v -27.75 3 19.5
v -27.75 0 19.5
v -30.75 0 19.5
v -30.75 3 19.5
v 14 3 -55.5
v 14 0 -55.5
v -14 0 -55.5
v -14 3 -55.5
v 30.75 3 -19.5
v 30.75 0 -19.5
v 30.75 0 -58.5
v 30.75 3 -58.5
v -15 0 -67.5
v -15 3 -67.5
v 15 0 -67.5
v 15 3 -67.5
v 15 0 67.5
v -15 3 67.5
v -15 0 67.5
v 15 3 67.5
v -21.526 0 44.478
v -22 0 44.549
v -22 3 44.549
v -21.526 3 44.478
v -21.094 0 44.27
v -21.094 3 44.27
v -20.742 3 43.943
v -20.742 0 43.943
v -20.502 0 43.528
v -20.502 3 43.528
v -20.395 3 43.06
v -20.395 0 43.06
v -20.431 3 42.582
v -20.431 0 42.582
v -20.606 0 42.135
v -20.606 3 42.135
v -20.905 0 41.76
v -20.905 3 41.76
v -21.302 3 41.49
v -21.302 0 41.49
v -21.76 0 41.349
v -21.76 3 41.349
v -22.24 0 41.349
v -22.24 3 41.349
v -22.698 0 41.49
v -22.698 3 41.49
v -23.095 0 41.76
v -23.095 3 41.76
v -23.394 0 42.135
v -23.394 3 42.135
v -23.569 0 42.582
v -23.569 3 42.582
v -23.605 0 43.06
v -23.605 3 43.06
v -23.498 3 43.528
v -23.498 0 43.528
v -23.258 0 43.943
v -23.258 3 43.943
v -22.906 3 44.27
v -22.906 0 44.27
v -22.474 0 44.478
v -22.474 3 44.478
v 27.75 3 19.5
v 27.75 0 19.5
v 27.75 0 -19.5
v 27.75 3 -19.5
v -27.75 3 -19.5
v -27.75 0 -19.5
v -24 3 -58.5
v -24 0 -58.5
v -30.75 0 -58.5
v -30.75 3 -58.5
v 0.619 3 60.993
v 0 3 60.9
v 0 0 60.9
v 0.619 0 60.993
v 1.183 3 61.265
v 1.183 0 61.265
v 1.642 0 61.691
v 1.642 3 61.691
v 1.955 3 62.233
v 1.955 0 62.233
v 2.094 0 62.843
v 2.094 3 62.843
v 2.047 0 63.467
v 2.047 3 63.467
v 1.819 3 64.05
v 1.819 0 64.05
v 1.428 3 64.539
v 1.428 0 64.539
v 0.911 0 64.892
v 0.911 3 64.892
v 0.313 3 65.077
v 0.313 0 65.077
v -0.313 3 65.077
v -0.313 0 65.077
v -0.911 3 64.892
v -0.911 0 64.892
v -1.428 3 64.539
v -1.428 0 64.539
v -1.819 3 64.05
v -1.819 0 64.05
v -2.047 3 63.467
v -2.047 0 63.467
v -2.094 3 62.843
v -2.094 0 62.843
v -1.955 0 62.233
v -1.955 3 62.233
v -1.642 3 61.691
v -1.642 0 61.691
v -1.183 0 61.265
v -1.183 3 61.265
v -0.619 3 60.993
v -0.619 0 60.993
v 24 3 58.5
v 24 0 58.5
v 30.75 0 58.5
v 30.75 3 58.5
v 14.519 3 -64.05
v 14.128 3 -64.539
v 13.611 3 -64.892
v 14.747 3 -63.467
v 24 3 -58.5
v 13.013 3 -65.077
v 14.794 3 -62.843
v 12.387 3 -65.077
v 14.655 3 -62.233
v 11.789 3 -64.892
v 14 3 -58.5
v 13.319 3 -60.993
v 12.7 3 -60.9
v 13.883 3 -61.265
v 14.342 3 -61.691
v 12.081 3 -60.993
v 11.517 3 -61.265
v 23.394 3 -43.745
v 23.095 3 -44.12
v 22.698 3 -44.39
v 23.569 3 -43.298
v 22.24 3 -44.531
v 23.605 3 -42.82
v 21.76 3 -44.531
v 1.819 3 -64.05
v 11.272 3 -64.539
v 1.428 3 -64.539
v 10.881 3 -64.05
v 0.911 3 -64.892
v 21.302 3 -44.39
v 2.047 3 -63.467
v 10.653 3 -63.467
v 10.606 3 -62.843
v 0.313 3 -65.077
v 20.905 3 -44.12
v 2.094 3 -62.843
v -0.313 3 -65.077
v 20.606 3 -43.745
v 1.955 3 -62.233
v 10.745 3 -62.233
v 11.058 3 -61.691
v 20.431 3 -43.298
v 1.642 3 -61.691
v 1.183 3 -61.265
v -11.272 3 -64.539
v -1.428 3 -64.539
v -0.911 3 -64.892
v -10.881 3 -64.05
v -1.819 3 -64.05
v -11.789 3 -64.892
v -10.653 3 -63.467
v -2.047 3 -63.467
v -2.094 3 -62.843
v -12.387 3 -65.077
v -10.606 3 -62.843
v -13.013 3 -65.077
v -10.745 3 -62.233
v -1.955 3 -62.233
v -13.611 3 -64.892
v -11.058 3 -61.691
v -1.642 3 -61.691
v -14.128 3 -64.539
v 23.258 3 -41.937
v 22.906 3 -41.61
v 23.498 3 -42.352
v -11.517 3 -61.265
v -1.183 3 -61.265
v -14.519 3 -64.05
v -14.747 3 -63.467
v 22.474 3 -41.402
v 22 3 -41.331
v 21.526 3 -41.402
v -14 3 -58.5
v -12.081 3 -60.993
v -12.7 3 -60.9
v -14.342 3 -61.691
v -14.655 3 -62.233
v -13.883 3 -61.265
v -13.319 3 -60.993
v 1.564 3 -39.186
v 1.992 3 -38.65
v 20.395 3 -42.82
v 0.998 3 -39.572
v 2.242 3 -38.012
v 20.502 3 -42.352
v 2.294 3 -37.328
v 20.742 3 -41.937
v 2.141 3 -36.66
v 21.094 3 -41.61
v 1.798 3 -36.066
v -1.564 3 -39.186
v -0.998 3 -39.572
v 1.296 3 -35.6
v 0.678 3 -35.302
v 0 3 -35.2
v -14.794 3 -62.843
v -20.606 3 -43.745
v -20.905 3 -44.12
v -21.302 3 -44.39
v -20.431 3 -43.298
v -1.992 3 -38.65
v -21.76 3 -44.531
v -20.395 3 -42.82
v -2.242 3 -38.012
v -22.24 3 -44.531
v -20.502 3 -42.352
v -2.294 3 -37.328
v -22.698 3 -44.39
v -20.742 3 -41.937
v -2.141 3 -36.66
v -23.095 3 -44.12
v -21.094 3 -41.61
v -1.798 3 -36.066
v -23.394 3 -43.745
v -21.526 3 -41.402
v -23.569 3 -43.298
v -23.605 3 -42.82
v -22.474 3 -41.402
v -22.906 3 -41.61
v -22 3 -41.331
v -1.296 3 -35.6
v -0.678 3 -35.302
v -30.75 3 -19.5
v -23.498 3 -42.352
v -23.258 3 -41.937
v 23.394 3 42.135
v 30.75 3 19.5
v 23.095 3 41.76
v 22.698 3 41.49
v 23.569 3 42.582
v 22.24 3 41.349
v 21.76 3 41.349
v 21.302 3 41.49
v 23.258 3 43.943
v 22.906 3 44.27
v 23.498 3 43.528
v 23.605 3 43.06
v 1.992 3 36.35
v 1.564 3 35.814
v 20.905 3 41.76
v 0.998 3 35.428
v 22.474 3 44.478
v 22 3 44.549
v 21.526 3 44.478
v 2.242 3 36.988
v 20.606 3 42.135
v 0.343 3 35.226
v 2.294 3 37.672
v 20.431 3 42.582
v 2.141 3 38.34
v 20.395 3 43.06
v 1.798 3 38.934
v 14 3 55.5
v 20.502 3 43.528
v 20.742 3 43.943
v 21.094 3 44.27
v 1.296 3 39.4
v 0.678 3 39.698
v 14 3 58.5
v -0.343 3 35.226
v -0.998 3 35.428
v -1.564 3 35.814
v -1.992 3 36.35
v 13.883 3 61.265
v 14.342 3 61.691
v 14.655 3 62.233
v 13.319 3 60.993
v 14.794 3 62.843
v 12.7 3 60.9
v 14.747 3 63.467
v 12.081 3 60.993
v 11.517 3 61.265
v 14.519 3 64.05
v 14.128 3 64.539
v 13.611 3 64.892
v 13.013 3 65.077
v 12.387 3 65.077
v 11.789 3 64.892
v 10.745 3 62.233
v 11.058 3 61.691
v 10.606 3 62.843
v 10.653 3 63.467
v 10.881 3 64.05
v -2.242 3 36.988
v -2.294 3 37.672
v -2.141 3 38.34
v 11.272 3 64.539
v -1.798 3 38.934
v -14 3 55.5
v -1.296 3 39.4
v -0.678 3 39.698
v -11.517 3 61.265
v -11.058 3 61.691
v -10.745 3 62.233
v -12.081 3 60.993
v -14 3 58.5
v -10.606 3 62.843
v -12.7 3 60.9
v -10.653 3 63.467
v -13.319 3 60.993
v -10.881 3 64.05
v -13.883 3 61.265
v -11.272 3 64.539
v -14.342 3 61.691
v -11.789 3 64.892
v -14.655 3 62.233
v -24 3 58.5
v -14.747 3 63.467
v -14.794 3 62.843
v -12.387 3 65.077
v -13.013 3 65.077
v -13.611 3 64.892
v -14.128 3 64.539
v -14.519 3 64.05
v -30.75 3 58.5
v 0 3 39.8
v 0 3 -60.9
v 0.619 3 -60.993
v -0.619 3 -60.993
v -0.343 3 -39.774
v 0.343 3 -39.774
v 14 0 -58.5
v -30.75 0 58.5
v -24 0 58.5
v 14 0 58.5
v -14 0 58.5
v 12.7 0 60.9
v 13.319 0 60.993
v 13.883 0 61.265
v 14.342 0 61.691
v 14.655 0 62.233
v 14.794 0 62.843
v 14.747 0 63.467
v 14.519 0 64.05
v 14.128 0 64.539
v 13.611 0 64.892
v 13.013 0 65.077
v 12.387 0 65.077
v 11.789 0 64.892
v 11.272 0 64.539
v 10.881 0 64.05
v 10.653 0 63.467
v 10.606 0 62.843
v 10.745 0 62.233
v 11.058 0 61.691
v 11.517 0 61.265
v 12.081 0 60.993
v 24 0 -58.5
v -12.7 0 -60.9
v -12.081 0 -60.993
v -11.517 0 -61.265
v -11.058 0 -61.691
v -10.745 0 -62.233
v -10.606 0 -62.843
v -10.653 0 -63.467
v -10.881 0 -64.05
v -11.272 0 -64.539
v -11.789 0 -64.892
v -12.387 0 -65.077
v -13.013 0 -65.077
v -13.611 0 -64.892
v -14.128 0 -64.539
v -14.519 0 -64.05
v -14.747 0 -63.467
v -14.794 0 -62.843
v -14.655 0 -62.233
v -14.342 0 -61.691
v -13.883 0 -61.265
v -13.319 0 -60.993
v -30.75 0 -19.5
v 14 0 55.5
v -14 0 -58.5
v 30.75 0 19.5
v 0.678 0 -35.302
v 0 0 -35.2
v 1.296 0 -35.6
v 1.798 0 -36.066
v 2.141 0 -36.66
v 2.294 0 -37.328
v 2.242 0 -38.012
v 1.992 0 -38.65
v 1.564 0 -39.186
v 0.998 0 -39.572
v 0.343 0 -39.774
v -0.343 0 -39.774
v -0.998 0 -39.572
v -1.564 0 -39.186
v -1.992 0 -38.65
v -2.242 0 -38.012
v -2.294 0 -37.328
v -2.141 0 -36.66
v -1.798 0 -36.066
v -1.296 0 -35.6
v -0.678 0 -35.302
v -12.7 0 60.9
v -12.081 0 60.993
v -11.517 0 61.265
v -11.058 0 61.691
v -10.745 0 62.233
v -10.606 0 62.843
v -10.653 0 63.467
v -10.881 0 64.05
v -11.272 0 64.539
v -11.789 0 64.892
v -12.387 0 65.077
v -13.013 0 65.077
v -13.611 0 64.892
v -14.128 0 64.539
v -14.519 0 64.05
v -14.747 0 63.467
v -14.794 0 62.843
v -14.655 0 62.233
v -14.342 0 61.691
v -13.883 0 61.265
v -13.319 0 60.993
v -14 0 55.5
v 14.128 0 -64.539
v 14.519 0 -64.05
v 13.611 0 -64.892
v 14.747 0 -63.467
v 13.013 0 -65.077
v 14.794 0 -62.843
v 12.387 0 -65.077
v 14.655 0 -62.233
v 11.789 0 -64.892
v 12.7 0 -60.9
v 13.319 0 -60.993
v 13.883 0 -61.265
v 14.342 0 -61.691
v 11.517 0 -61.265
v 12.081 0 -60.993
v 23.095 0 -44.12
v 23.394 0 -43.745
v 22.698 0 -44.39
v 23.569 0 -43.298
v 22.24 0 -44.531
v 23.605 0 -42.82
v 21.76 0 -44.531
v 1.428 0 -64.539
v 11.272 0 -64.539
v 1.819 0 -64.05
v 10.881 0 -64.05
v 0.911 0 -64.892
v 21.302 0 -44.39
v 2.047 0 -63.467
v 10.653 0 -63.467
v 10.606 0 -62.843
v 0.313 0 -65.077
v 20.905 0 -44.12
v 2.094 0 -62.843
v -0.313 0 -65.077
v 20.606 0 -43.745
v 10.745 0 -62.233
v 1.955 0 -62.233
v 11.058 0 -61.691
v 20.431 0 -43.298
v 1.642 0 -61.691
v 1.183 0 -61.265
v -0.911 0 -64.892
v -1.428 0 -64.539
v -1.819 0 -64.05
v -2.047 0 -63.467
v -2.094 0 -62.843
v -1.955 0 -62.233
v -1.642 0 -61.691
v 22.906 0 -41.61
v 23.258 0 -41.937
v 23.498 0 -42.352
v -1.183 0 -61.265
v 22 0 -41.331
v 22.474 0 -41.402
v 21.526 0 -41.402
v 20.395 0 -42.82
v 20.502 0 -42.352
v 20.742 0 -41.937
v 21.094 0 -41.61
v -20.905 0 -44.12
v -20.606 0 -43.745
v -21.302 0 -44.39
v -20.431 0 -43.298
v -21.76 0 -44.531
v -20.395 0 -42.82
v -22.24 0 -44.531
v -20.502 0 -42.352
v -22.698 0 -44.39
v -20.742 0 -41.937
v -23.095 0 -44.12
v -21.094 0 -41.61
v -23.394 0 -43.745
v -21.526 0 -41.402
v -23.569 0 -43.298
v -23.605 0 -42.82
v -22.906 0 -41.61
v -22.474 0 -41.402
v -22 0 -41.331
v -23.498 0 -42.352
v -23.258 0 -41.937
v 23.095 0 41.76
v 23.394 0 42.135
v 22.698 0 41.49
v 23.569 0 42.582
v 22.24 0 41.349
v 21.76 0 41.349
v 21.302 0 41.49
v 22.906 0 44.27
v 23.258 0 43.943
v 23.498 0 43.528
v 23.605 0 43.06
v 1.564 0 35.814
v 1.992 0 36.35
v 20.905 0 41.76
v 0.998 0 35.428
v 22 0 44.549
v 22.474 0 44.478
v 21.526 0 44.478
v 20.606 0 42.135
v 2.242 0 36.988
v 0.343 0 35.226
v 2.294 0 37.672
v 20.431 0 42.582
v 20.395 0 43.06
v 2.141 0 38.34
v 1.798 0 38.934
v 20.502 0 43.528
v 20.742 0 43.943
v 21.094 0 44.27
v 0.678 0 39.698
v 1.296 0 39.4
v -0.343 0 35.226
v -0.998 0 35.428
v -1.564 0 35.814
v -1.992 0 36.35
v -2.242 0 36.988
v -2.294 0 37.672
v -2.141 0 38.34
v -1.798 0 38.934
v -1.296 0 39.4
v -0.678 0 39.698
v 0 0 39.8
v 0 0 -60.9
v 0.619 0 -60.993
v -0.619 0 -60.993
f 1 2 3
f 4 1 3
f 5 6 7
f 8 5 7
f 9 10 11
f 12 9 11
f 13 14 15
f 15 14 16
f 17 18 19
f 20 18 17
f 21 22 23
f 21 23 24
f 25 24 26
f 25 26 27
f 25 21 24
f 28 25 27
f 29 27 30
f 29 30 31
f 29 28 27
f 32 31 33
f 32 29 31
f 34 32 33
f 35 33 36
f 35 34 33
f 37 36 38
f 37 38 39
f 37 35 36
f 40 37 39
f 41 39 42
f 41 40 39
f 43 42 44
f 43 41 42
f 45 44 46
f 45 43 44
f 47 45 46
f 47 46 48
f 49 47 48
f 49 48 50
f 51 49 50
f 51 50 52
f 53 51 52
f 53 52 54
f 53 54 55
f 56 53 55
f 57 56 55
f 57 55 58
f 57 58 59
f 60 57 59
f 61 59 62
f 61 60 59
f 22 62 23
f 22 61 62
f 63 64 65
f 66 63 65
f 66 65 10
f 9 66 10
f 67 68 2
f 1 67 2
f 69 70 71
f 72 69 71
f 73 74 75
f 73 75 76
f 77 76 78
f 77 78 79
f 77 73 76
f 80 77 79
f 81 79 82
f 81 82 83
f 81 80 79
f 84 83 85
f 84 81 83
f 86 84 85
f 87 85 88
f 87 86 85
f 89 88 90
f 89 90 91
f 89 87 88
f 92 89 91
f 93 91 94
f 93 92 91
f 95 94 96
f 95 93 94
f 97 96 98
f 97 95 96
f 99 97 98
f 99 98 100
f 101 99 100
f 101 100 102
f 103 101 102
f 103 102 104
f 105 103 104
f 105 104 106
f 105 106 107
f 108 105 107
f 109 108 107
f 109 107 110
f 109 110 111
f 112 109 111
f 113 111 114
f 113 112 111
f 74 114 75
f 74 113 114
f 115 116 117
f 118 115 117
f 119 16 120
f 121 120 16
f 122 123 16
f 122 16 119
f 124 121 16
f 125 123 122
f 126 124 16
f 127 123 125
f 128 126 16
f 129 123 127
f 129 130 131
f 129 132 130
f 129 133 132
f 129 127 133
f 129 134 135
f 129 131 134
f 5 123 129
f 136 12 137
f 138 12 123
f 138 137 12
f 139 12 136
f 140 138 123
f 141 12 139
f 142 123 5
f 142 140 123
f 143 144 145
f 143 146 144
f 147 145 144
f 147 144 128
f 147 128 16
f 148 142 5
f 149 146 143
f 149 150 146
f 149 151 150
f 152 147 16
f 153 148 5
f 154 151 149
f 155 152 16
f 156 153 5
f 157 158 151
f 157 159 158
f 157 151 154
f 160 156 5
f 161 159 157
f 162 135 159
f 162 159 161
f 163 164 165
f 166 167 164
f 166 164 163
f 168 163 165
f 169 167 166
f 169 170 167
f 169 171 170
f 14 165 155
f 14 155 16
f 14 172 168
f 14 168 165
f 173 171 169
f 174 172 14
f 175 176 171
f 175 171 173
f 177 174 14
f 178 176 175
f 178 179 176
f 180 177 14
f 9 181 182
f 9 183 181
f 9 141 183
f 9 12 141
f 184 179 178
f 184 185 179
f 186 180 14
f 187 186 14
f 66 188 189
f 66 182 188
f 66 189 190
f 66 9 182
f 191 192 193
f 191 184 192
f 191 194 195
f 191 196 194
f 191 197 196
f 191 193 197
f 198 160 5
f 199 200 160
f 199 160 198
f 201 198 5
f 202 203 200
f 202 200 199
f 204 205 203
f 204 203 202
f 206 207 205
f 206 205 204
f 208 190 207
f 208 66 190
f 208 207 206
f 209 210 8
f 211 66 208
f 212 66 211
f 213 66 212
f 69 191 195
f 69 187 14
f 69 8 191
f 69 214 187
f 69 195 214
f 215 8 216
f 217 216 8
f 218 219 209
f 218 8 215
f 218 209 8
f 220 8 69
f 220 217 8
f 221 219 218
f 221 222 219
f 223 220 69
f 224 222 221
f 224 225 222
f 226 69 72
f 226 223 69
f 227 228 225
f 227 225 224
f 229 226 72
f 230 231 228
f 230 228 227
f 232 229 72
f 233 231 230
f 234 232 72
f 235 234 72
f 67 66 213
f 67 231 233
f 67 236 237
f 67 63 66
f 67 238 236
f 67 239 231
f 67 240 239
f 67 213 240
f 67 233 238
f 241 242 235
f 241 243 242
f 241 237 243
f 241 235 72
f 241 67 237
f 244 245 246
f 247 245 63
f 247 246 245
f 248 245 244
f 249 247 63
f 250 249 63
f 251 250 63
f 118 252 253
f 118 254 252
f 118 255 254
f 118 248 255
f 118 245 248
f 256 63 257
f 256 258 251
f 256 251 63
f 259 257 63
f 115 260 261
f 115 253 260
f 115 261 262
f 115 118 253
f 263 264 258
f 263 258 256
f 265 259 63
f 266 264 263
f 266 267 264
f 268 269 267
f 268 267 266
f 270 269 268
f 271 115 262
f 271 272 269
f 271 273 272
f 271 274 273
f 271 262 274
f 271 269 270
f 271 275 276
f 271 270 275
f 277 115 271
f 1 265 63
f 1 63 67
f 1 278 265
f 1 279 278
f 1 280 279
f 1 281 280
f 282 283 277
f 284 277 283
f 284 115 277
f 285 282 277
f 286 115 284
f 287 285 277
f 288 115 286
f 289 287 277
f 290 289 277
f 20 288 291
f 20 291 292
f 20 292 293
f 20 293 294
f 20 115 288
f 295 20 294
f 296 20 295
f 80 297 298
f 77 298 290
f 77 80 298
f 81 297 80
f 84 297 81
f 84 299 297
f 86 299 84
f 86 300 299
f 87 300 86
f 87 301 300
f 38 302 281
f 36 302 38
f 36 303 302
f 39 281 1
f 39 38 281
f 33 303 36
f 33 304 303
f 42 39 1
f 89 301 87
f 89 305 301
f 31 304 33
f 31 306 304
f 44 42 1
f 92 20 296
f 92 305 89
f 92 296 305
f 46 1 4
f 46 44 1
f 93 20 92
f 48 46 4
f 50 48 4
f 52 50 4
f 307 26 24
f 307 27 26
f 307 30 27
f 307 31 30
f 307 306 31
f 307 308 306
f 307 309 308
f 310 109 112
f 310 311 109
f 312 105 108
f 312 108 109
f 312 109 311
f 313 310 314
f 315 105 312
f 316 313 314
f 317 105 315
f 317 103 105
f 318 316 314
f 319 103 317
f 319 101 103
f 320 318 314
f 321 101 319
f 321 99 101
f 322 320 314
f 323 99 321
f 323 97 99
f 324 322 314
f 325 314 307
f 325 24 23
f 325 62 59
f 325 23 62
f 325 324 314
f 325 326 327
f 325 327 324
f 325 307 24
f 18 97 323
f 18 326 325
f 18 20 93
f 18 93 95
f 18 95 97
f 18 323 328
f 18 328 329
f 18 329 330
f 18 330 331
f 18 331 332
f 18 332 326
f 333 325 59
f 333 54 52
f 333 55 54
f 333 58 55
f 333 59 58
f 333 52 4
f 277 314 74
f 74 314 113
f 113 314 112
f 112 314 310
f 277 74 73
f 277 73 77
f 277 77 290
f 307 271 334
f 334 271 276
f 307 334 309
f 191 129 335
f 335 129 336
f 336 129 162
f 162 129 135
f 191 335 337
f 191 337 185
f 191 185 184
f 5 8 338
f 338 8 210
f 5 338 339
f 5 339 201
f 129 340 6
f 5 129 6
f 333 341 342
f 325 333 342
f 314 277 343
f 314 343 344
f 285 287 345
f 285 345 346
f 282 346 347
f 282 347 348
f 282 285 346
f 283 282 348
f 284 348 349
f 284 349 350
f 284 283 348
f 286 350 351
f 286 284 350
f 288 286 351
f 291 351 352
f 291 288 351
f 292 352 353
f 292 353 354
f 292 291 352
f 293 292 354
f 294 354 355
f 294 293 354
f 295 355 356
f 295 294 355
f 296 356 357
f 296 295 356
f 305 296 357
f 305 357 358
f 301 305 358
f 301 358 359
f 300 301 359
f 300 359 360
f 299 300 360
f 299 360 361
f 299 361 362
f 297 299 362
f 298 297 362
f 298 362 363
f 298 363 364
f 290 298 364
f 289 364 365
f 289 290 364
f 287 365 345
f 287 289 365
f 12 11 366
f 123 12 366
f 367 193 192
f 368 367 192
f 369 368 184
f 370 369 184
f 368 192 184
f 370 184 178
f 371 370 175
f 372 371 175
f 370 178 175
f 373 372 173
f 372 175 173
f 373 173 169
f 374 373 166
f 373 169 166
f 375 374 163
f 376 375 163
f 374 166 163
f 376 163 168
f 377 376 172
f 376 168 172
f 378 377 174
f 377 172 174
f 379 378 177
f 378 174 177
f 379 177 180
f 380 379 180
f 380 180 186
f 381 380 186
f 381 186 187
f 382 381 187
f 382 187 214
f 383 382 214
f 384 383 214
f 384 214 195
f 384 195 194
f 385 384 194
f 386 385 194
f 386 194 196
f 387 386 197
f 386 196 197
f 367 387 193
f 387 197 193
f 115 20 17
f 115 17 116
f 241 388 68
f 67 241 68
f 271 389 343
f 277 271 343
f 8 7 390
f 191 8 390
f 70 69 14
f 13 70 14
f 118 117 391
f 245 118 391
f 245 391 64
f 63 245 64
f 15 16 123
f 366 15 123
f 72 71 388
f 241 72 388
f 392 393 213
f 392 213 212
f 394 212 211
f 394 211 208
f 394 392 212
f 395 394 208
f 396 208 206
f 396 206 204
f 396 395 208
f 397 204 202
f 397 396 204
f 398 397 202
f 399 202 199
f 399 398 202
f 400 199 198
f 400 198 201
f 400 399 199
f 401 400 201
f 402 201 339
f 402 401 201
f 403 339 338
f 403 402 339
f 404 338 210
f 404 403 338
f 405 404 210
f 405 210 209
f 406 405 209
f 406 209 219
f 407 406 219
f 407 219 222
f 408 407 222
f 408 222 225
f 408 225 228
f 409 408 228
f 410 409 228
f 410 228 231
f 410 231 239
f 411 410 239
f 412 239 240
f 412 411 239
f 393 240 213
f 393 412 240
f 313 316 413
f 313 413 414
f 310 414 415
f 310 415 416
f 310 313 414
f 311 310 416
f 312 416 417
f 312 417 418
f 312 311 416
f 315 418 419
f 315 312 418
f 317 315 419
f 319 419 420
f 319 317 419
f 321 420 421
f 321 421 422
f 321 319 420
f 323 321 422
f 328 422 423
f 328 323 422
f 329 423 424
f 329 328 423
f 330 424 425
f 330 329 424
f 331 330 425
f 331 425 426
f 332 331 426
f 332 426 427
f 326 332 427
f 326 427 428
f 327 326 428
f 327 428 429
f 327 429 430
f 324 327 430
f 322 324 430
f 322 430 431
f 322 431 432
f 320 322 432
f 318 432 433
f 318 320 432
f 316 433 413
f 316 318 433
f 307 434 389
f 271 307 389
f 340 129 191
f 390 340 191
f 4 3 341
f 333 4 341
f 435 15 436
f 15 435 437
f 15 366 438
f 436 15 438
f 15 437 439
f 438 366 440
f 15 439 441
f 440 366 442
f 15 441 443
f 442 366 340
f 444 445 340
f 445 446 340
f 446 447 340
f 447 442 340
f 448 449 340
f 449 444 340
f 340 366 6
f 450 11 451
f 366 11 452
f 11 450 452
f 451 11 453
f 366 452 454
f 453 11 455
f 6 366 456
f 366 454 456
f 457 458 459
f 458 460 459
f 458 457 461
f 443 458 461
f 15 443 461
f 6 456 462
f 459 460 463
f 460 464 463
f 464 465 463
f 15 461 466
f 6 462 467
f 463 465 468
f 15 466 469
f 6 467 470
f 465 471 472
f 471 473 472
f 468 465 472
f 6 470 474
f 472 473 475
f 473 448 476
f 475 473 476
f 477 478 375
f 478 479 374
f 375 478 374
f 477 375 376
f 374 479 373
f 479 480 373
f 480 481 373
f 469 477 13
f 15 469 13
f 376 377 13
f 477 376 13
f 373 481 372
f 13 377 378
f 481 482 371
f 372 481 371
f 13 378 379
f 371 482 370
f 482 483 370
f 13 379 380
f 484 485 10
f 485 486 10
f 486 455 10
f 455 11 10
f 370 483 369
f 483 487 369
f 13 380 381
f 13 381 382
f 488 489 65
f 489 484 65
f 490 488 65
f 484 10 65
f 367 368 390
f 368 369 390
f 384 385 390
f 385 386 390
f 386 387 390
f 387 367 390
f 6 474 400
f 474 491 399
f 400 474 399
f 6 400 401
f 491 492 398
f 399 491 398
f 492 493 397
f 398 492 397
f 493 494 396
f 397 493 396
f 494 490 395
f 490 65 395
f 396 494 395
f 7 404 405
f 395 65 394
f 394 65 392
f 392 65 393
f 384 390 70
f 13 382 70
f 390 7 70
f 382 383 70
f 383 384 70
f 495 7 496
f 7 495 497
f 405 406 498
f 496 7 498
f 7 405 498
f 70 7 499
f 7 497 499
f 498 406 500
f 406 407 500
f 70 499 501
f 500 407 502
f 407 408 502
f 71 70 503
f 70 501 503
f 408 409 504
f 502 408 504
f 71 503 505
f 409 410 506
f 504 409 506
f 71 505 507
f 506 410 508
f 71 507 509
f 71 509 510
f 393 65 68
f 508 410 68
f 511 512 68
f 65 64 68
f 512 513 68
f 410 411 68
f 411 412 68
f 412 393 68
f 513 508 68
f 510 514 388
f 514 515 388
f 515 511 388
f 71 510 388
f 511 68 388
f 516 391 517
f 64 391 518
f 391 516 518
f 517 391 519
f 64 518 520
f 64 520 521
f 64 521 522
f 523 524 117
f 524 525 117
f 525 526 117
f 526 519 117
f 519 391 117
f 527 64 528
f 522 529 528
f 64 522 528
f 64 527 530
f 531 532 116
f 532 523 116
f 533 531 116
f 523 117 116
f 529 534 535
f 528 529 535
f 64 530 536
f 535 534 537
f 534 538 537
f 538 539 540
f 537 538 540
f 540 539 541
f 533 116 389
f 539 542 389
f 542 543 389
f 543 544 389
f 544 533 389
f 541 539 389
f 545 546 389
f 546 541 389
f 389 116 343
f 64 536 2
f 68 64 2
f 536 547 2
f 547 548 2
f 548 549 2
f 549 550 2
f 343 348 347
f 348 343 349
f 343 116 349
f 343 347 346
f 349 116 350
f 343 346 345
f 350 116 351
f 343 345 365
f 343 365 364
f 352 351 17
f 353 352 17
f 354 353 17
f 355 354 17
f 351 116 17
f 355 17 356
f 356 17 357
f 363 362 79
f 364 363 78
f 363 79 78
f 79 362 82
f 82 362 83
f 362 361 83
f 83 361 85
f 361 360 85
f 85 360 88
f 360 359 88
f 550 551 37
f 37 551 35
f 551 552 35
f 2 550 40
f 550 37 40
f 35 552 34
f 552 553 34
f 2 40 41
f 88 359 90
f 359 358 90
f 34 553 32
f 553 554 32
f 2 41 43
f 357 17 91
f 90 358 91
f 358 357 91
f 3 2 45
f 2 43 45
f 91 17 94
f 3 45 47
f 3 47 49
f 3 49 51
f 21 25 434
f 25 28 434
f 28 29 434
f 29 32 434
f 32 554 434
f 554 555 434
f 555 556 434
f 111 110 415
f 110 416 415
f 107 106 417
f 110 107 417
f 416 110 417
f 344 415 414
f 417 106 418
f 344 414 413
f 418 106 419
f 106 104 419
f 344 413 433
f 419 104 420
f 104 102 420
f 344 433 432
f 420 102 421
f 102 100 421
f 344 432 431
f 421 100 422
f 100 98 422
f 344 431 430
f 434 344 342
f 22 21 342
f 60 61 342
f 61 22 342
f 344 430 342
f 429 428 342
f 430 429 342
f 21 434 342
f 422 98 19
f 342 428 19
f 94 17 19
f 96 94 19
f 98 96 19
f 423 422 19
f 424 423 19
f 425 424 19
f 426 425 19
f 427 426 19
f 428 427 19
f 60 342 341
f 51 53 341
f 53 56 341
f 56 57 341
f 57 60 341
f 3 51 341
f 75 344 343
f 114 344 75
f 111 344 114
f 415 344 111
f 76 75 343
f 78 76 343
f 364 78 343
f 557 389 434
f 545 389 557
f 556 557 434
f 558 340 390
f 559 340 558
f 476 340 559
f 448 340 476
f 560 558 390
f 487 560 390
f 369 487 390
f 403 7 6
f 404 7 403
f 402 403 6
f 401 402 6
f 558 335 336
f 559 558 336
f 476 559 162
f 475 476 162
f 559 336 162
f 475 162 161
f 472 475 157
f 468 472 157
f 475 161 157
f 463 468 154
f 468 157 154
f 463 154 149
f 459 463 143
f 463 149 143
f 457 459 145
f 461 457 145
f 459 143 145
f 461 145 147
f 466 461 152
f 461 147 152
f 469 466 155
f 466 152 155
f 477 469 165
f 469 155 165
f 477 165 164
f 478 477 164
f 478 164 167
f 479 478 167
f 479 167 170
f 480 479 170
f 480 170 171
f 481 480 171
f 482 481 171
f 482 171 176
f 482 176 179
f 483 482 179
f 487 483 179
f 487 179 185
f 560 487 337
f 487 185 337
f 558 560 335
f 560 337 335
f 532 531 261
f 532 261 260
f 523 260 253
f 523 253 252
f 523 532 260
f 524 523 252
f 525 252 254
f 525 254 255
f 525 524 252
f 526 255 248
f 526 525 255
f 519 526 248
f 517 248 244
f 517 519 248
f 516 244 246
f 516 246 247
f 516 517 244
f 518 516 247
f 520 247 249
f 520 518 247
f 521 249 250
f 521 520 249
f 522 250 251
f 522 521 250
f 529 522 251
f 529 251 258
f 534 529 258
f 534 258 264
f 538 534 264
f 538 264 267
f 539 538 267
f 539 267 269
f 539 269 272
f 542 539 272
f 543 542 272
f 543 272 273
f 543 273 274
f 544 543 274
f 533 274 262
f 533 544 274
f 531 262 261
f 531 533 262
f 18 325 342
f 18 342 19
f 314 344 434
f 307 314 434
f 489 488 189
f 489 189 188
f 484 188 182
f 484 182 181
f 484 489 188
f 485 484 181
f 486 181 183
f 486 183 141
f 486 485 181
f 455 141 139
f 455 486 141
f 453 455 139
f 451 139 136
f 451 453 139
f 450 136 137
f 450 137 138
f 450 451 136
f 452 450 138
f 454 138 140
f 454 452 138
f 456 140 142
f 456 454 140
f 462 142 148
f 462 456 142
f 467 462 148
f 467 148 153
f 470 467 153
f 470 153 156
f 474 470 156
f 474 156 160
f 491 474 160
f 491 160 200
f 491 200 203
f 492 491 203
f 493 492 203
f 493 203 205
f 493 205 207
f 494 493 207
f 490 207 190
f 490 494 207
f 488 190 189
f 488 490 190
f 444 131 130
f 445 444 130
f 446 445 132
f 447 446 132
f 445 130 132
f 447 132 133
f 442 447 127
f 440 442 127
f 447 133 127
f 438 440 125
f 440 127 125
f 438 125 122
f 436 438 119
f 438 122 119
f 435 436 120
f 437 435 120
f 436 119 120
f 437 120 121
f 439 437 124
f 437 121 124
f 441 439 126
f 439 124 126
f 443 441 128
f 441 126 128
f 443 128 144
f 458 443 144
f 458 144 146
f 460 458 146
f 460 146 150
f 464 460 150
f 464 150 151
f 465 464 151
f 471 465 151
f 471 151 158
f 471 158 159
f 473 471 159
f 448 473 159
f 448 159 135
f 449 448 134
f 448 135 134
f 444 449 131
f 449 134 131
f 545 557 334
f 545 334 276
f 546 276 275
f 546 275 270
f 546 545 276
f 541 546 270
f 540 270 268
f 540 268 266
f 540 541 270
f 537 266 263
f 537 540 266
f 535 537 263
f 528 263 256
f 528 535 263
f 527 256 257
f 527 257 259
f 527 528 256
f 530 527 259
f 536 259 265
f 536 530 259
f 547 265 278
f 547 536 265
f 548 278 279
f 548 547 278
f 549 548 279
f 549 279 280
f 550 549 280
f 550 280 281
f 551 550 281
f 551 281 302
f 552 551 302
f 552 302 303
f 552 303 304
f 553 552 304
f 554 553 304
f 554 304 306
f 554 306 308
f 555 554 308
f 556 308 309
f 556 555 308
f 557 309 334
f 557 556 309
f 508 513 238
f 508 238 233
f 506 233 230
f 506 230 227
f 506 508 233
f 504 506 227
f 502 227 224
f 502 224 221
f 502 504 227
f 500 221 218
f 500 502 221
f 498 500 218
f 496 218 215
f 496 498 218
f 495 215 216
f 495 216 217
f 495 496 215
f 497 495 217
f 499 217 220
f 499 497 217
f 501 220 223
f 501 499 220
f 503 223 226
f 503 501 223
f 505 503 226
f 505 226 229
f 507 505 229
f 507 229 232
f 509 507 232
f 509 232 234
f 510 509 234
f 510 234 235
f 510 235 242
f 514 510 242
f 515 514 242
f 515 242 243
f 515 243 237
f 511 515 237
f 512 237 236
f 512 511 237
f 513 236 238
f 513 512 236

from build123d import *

# Parameters (mm, degrees)
SKETCH1_R           = 2.3
SKETCH1_R_2         = 1.609204822
BOSS_EXTRUDE1_DEPTH = 3
SKETCH2_R           = 2.1
BOSS_EXTRUDE2_DEPTH = 3


with BuildPart() as part:
    # Sketch1 → Boss-Extrude1 (new body)
    with BuildSketch(Plane(origin=(0, 0, 0), x_dir=(1, 0, 0), z_dir=(0, 1, 0))):
        Polygon((-30.75, 58.5), (-30.75, 19.5), (-27.75, 19.5), (-27.75, -19.5), (-30.75, -19.5), (-30.75, -58.5), (-14, -58.5), (-14, -55.5), (14, -55.5), (14, -58.5), (30.75, -58.5), (30.75, -19.5), (27.75, -19.5), (27.75, 19.5), (30.75, 19.5), (30.75, 58.5), (14, 58.5), (14, 55.5), (-14, 55.5), (-14, 58.5), align=None)
        with Locations(Location((0, 37.5, 0), (0, 0, 270))):
            Circle(SKETCH1_R, mode=Mode.SUBTRACT)
        with Locations(Location((0, -37.5, 0), (0, 0, 270))):
            Circle(SKETCH1_R, mode=Mode.SUBTRACT)
        with Locations(Location((-22, -42.94, 0), (0, 0, 270))):
            Circle(SKETCH1_R_2, mode=Mode.SUBTRACT)
        with Locations(Location((22, -42.94, 0), (0, 0, 270))):
            Circle(SKETCH1_R_2, mode=Mode.SUBTRACT)
        with Locations(Location((22, 42.94, 0), (0, 0, 270))):
            Circle(SKETCH1_R_2, mode=Mode.SUBTRACT)
        with Locations(Location((-22, 42.94, 0), (0, 0, 270))):
            Circle(SKETCH1_R_2, mode=Mode.SUBTRACT)
    extrude(amount=BOSS_EXTRUDE1_DEPTH)

    # Sketch2 → Boss-Extrude2 (add)
    with BuildSketch(Plane(origin=(0, 3, 0), x_dir=(1, 0, 0), z_dir=(0, 1, 0))):
        Polygon((-24, 58.5), (-15, 67.5), (15, 67.5), (24, 58.5), align=None)
        with Locations(Location((0, 63, 0), (0, 0, 270))):
            Circle(SKETCH2_R, mode=Mode.SUBTRACT)
        with Locations(Location((12.7, 63, 0), (0, 0, 270))):
            Circle(SKETCH2_R, mode=Mode.SUBTRACT)
        with Locations(Location((-12.7, 63, 0), (0, 0, 270))):
            Circle(SKETCH2_R, mode=Mode.SUBTRACT)
    boss_extrude2 = extrude(amount=-BOSS_EXTRUDE2_DEPTH)

    # Mirror1: Boss-Extrude2 across plane
    add(boss_extrude2.mirror(Plane.XY))


solid = part.part
